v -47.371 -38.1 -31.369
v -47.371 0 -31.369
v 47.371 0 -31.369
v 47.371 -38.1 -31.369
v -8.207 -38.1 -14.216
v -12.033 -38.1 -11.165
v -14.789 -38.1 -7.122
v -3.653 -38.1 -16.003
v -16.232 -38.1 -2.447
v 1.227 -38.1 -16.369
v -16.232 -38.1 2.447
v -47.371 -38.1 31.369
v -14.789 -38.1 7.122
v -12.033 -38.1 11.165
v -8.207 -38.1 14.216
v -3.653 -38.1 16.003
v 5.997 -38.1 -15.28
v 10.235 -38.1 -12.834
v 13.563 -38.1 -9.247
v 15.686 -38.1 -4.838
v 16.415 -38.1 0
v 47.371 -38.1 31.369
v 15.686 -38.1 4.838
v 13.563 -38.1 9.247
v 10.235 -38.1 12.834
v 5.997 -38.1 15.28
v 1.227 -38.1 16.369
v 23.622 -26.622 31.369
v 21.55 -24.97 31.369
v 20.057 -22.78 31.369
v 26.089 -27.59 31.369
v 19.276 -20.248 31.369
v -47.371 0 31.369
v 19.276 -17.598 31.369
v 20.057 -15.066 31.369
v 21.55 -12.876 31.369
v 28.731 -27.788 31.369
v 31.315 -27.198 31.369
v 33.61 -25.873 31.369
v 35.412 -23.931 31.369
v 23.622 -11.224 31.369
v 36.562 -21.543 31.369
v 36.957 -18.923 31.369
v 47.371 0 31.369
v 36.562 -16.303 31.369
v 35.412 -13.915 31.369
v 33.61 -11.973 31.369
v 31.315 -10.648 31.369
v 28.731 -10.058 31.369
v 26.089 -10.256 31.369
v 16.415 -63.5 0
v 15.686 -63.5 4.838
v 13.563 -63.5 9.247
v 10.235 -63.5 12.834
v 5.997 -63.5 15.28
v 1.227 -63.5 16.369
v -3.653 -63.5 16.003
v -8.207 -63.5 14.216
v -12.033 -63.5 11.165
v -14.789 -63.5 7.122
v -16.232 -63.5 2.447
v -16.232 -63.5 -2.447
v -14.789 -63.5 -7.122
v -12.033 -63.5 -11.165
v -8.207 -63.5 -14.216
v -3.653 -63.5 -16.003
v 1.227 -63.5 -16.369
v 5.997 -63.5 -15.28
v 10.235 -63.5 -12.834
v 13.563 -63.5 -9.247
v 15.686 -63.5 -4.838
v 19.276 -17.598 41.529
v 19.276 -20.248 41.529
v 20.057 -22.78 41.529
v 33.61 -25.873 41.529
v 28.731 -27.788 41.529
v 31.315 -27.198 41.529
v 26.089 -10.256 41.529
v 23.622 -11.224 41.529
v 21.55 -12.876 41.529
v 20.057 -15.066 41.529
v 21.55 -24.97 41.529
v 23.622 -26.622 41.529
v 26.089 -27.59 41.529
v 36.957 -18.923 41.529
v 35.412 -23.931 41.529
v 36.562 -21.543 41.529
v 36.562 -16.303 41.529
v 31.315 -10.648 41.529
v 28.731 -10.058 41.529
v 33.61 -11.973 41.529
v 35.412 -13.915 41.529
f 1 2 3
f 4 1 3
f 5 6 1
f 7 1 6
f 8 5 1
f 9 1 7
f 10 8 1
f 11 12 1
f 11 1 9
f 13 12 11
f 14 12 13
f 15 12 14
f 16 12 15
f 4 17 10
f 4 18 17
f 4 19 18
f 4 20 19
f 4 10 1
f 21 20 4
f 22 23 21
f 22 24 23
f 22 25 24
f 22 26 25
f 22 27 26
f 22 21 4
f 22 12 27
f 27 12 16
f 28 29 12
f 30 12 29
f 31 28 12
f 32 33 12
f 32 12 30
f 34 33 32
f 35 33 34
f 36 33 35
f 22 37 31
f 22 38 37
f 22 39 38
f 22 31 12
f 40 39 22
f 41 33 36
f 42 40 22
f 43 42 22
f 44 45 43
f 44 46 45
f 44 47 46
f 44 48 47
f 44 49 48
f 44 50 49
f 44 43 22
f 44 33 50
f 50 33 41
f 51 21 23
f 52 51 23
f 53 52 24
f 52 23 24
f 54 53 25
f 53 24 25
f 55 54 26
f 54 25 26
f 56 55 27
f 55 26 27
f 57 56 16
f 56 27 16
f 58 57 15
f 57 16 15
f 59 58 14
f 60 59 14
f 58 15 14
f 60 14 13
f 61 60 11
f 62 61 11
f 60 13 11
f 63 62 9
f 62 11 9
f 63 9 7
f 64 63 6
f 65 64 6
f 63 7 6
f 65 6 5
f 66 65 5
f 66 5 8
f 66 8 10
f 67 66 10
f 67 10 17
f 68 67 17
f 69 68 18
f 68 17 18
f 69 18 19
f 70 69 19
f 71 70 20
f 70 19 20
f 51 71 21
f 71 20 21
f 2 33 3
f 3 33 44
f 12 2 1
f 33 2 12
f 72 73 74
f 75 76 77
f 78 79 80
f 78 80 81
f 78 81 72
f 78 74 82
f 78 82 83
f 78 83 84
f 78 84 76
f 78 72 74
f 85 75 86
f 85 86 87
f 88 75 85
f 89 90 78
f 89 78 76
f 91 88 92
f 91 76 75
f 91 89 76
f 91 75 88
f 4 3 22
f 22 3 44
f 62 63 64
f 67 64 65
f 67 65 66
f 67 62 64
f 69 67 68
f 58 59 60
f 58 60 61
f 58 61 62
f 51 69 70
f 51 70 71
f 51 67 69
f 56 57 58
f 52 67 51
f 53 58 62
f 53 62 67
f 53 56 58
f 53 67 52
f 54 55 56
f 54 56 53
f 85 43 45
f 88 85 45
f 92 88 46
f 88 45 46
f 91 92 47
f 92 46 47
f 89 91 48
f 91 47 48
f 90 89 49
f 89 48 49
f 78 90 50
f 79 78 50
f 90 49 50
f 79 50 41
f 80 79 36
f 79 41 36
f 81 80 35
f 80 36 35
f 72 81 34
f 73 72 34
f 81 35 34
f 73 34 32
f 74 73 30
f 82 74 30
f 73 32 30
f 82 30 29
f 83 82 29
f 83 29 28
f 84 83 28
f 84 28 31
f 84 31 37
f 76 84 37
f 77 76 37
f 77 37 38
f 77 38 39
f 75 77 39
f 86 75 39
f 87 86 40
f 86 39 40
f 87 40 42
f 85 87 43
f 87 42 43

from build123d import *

# Parameters (mm, degrees)
F0_W          = 94.742008
F0_H          = 62.738002
F1_DEPTH      = 38.1
F2_R          = 16.414966
F3_DEPTH      = 25.4
F3_DEPTH_BACK = 12.7
F4_R          = 8.890001
F5_DEPTH      = 10.16


with BuildPart() as f1:
    # F0 (on Front) → F1 (new body)
    with BuildSketch(Plane.XZ):
        Rectangle(F0_W, F0_H)
    extrude(amount=F1_DEPTH)

    # F2 (on face) → F3 (join, two sides)
    with BuildSketch(Plane.XZ.offset(38.1)) as f3_sk:
        Circle(F2_R)
    extrude(amount=F3_DEPTH)
    extrude(f3_sk.sketch, amount=-F3_DEPTH_BACK)

    # F4 (on face) → F5 (join)
    with BuildSketch(Plane.XY.offset(31.369001)):
        with Locations((28.066998, -18.923)):
            Circle(F4_R)
    extrude(amount=F5_DEPTH)


solid = f1.part
